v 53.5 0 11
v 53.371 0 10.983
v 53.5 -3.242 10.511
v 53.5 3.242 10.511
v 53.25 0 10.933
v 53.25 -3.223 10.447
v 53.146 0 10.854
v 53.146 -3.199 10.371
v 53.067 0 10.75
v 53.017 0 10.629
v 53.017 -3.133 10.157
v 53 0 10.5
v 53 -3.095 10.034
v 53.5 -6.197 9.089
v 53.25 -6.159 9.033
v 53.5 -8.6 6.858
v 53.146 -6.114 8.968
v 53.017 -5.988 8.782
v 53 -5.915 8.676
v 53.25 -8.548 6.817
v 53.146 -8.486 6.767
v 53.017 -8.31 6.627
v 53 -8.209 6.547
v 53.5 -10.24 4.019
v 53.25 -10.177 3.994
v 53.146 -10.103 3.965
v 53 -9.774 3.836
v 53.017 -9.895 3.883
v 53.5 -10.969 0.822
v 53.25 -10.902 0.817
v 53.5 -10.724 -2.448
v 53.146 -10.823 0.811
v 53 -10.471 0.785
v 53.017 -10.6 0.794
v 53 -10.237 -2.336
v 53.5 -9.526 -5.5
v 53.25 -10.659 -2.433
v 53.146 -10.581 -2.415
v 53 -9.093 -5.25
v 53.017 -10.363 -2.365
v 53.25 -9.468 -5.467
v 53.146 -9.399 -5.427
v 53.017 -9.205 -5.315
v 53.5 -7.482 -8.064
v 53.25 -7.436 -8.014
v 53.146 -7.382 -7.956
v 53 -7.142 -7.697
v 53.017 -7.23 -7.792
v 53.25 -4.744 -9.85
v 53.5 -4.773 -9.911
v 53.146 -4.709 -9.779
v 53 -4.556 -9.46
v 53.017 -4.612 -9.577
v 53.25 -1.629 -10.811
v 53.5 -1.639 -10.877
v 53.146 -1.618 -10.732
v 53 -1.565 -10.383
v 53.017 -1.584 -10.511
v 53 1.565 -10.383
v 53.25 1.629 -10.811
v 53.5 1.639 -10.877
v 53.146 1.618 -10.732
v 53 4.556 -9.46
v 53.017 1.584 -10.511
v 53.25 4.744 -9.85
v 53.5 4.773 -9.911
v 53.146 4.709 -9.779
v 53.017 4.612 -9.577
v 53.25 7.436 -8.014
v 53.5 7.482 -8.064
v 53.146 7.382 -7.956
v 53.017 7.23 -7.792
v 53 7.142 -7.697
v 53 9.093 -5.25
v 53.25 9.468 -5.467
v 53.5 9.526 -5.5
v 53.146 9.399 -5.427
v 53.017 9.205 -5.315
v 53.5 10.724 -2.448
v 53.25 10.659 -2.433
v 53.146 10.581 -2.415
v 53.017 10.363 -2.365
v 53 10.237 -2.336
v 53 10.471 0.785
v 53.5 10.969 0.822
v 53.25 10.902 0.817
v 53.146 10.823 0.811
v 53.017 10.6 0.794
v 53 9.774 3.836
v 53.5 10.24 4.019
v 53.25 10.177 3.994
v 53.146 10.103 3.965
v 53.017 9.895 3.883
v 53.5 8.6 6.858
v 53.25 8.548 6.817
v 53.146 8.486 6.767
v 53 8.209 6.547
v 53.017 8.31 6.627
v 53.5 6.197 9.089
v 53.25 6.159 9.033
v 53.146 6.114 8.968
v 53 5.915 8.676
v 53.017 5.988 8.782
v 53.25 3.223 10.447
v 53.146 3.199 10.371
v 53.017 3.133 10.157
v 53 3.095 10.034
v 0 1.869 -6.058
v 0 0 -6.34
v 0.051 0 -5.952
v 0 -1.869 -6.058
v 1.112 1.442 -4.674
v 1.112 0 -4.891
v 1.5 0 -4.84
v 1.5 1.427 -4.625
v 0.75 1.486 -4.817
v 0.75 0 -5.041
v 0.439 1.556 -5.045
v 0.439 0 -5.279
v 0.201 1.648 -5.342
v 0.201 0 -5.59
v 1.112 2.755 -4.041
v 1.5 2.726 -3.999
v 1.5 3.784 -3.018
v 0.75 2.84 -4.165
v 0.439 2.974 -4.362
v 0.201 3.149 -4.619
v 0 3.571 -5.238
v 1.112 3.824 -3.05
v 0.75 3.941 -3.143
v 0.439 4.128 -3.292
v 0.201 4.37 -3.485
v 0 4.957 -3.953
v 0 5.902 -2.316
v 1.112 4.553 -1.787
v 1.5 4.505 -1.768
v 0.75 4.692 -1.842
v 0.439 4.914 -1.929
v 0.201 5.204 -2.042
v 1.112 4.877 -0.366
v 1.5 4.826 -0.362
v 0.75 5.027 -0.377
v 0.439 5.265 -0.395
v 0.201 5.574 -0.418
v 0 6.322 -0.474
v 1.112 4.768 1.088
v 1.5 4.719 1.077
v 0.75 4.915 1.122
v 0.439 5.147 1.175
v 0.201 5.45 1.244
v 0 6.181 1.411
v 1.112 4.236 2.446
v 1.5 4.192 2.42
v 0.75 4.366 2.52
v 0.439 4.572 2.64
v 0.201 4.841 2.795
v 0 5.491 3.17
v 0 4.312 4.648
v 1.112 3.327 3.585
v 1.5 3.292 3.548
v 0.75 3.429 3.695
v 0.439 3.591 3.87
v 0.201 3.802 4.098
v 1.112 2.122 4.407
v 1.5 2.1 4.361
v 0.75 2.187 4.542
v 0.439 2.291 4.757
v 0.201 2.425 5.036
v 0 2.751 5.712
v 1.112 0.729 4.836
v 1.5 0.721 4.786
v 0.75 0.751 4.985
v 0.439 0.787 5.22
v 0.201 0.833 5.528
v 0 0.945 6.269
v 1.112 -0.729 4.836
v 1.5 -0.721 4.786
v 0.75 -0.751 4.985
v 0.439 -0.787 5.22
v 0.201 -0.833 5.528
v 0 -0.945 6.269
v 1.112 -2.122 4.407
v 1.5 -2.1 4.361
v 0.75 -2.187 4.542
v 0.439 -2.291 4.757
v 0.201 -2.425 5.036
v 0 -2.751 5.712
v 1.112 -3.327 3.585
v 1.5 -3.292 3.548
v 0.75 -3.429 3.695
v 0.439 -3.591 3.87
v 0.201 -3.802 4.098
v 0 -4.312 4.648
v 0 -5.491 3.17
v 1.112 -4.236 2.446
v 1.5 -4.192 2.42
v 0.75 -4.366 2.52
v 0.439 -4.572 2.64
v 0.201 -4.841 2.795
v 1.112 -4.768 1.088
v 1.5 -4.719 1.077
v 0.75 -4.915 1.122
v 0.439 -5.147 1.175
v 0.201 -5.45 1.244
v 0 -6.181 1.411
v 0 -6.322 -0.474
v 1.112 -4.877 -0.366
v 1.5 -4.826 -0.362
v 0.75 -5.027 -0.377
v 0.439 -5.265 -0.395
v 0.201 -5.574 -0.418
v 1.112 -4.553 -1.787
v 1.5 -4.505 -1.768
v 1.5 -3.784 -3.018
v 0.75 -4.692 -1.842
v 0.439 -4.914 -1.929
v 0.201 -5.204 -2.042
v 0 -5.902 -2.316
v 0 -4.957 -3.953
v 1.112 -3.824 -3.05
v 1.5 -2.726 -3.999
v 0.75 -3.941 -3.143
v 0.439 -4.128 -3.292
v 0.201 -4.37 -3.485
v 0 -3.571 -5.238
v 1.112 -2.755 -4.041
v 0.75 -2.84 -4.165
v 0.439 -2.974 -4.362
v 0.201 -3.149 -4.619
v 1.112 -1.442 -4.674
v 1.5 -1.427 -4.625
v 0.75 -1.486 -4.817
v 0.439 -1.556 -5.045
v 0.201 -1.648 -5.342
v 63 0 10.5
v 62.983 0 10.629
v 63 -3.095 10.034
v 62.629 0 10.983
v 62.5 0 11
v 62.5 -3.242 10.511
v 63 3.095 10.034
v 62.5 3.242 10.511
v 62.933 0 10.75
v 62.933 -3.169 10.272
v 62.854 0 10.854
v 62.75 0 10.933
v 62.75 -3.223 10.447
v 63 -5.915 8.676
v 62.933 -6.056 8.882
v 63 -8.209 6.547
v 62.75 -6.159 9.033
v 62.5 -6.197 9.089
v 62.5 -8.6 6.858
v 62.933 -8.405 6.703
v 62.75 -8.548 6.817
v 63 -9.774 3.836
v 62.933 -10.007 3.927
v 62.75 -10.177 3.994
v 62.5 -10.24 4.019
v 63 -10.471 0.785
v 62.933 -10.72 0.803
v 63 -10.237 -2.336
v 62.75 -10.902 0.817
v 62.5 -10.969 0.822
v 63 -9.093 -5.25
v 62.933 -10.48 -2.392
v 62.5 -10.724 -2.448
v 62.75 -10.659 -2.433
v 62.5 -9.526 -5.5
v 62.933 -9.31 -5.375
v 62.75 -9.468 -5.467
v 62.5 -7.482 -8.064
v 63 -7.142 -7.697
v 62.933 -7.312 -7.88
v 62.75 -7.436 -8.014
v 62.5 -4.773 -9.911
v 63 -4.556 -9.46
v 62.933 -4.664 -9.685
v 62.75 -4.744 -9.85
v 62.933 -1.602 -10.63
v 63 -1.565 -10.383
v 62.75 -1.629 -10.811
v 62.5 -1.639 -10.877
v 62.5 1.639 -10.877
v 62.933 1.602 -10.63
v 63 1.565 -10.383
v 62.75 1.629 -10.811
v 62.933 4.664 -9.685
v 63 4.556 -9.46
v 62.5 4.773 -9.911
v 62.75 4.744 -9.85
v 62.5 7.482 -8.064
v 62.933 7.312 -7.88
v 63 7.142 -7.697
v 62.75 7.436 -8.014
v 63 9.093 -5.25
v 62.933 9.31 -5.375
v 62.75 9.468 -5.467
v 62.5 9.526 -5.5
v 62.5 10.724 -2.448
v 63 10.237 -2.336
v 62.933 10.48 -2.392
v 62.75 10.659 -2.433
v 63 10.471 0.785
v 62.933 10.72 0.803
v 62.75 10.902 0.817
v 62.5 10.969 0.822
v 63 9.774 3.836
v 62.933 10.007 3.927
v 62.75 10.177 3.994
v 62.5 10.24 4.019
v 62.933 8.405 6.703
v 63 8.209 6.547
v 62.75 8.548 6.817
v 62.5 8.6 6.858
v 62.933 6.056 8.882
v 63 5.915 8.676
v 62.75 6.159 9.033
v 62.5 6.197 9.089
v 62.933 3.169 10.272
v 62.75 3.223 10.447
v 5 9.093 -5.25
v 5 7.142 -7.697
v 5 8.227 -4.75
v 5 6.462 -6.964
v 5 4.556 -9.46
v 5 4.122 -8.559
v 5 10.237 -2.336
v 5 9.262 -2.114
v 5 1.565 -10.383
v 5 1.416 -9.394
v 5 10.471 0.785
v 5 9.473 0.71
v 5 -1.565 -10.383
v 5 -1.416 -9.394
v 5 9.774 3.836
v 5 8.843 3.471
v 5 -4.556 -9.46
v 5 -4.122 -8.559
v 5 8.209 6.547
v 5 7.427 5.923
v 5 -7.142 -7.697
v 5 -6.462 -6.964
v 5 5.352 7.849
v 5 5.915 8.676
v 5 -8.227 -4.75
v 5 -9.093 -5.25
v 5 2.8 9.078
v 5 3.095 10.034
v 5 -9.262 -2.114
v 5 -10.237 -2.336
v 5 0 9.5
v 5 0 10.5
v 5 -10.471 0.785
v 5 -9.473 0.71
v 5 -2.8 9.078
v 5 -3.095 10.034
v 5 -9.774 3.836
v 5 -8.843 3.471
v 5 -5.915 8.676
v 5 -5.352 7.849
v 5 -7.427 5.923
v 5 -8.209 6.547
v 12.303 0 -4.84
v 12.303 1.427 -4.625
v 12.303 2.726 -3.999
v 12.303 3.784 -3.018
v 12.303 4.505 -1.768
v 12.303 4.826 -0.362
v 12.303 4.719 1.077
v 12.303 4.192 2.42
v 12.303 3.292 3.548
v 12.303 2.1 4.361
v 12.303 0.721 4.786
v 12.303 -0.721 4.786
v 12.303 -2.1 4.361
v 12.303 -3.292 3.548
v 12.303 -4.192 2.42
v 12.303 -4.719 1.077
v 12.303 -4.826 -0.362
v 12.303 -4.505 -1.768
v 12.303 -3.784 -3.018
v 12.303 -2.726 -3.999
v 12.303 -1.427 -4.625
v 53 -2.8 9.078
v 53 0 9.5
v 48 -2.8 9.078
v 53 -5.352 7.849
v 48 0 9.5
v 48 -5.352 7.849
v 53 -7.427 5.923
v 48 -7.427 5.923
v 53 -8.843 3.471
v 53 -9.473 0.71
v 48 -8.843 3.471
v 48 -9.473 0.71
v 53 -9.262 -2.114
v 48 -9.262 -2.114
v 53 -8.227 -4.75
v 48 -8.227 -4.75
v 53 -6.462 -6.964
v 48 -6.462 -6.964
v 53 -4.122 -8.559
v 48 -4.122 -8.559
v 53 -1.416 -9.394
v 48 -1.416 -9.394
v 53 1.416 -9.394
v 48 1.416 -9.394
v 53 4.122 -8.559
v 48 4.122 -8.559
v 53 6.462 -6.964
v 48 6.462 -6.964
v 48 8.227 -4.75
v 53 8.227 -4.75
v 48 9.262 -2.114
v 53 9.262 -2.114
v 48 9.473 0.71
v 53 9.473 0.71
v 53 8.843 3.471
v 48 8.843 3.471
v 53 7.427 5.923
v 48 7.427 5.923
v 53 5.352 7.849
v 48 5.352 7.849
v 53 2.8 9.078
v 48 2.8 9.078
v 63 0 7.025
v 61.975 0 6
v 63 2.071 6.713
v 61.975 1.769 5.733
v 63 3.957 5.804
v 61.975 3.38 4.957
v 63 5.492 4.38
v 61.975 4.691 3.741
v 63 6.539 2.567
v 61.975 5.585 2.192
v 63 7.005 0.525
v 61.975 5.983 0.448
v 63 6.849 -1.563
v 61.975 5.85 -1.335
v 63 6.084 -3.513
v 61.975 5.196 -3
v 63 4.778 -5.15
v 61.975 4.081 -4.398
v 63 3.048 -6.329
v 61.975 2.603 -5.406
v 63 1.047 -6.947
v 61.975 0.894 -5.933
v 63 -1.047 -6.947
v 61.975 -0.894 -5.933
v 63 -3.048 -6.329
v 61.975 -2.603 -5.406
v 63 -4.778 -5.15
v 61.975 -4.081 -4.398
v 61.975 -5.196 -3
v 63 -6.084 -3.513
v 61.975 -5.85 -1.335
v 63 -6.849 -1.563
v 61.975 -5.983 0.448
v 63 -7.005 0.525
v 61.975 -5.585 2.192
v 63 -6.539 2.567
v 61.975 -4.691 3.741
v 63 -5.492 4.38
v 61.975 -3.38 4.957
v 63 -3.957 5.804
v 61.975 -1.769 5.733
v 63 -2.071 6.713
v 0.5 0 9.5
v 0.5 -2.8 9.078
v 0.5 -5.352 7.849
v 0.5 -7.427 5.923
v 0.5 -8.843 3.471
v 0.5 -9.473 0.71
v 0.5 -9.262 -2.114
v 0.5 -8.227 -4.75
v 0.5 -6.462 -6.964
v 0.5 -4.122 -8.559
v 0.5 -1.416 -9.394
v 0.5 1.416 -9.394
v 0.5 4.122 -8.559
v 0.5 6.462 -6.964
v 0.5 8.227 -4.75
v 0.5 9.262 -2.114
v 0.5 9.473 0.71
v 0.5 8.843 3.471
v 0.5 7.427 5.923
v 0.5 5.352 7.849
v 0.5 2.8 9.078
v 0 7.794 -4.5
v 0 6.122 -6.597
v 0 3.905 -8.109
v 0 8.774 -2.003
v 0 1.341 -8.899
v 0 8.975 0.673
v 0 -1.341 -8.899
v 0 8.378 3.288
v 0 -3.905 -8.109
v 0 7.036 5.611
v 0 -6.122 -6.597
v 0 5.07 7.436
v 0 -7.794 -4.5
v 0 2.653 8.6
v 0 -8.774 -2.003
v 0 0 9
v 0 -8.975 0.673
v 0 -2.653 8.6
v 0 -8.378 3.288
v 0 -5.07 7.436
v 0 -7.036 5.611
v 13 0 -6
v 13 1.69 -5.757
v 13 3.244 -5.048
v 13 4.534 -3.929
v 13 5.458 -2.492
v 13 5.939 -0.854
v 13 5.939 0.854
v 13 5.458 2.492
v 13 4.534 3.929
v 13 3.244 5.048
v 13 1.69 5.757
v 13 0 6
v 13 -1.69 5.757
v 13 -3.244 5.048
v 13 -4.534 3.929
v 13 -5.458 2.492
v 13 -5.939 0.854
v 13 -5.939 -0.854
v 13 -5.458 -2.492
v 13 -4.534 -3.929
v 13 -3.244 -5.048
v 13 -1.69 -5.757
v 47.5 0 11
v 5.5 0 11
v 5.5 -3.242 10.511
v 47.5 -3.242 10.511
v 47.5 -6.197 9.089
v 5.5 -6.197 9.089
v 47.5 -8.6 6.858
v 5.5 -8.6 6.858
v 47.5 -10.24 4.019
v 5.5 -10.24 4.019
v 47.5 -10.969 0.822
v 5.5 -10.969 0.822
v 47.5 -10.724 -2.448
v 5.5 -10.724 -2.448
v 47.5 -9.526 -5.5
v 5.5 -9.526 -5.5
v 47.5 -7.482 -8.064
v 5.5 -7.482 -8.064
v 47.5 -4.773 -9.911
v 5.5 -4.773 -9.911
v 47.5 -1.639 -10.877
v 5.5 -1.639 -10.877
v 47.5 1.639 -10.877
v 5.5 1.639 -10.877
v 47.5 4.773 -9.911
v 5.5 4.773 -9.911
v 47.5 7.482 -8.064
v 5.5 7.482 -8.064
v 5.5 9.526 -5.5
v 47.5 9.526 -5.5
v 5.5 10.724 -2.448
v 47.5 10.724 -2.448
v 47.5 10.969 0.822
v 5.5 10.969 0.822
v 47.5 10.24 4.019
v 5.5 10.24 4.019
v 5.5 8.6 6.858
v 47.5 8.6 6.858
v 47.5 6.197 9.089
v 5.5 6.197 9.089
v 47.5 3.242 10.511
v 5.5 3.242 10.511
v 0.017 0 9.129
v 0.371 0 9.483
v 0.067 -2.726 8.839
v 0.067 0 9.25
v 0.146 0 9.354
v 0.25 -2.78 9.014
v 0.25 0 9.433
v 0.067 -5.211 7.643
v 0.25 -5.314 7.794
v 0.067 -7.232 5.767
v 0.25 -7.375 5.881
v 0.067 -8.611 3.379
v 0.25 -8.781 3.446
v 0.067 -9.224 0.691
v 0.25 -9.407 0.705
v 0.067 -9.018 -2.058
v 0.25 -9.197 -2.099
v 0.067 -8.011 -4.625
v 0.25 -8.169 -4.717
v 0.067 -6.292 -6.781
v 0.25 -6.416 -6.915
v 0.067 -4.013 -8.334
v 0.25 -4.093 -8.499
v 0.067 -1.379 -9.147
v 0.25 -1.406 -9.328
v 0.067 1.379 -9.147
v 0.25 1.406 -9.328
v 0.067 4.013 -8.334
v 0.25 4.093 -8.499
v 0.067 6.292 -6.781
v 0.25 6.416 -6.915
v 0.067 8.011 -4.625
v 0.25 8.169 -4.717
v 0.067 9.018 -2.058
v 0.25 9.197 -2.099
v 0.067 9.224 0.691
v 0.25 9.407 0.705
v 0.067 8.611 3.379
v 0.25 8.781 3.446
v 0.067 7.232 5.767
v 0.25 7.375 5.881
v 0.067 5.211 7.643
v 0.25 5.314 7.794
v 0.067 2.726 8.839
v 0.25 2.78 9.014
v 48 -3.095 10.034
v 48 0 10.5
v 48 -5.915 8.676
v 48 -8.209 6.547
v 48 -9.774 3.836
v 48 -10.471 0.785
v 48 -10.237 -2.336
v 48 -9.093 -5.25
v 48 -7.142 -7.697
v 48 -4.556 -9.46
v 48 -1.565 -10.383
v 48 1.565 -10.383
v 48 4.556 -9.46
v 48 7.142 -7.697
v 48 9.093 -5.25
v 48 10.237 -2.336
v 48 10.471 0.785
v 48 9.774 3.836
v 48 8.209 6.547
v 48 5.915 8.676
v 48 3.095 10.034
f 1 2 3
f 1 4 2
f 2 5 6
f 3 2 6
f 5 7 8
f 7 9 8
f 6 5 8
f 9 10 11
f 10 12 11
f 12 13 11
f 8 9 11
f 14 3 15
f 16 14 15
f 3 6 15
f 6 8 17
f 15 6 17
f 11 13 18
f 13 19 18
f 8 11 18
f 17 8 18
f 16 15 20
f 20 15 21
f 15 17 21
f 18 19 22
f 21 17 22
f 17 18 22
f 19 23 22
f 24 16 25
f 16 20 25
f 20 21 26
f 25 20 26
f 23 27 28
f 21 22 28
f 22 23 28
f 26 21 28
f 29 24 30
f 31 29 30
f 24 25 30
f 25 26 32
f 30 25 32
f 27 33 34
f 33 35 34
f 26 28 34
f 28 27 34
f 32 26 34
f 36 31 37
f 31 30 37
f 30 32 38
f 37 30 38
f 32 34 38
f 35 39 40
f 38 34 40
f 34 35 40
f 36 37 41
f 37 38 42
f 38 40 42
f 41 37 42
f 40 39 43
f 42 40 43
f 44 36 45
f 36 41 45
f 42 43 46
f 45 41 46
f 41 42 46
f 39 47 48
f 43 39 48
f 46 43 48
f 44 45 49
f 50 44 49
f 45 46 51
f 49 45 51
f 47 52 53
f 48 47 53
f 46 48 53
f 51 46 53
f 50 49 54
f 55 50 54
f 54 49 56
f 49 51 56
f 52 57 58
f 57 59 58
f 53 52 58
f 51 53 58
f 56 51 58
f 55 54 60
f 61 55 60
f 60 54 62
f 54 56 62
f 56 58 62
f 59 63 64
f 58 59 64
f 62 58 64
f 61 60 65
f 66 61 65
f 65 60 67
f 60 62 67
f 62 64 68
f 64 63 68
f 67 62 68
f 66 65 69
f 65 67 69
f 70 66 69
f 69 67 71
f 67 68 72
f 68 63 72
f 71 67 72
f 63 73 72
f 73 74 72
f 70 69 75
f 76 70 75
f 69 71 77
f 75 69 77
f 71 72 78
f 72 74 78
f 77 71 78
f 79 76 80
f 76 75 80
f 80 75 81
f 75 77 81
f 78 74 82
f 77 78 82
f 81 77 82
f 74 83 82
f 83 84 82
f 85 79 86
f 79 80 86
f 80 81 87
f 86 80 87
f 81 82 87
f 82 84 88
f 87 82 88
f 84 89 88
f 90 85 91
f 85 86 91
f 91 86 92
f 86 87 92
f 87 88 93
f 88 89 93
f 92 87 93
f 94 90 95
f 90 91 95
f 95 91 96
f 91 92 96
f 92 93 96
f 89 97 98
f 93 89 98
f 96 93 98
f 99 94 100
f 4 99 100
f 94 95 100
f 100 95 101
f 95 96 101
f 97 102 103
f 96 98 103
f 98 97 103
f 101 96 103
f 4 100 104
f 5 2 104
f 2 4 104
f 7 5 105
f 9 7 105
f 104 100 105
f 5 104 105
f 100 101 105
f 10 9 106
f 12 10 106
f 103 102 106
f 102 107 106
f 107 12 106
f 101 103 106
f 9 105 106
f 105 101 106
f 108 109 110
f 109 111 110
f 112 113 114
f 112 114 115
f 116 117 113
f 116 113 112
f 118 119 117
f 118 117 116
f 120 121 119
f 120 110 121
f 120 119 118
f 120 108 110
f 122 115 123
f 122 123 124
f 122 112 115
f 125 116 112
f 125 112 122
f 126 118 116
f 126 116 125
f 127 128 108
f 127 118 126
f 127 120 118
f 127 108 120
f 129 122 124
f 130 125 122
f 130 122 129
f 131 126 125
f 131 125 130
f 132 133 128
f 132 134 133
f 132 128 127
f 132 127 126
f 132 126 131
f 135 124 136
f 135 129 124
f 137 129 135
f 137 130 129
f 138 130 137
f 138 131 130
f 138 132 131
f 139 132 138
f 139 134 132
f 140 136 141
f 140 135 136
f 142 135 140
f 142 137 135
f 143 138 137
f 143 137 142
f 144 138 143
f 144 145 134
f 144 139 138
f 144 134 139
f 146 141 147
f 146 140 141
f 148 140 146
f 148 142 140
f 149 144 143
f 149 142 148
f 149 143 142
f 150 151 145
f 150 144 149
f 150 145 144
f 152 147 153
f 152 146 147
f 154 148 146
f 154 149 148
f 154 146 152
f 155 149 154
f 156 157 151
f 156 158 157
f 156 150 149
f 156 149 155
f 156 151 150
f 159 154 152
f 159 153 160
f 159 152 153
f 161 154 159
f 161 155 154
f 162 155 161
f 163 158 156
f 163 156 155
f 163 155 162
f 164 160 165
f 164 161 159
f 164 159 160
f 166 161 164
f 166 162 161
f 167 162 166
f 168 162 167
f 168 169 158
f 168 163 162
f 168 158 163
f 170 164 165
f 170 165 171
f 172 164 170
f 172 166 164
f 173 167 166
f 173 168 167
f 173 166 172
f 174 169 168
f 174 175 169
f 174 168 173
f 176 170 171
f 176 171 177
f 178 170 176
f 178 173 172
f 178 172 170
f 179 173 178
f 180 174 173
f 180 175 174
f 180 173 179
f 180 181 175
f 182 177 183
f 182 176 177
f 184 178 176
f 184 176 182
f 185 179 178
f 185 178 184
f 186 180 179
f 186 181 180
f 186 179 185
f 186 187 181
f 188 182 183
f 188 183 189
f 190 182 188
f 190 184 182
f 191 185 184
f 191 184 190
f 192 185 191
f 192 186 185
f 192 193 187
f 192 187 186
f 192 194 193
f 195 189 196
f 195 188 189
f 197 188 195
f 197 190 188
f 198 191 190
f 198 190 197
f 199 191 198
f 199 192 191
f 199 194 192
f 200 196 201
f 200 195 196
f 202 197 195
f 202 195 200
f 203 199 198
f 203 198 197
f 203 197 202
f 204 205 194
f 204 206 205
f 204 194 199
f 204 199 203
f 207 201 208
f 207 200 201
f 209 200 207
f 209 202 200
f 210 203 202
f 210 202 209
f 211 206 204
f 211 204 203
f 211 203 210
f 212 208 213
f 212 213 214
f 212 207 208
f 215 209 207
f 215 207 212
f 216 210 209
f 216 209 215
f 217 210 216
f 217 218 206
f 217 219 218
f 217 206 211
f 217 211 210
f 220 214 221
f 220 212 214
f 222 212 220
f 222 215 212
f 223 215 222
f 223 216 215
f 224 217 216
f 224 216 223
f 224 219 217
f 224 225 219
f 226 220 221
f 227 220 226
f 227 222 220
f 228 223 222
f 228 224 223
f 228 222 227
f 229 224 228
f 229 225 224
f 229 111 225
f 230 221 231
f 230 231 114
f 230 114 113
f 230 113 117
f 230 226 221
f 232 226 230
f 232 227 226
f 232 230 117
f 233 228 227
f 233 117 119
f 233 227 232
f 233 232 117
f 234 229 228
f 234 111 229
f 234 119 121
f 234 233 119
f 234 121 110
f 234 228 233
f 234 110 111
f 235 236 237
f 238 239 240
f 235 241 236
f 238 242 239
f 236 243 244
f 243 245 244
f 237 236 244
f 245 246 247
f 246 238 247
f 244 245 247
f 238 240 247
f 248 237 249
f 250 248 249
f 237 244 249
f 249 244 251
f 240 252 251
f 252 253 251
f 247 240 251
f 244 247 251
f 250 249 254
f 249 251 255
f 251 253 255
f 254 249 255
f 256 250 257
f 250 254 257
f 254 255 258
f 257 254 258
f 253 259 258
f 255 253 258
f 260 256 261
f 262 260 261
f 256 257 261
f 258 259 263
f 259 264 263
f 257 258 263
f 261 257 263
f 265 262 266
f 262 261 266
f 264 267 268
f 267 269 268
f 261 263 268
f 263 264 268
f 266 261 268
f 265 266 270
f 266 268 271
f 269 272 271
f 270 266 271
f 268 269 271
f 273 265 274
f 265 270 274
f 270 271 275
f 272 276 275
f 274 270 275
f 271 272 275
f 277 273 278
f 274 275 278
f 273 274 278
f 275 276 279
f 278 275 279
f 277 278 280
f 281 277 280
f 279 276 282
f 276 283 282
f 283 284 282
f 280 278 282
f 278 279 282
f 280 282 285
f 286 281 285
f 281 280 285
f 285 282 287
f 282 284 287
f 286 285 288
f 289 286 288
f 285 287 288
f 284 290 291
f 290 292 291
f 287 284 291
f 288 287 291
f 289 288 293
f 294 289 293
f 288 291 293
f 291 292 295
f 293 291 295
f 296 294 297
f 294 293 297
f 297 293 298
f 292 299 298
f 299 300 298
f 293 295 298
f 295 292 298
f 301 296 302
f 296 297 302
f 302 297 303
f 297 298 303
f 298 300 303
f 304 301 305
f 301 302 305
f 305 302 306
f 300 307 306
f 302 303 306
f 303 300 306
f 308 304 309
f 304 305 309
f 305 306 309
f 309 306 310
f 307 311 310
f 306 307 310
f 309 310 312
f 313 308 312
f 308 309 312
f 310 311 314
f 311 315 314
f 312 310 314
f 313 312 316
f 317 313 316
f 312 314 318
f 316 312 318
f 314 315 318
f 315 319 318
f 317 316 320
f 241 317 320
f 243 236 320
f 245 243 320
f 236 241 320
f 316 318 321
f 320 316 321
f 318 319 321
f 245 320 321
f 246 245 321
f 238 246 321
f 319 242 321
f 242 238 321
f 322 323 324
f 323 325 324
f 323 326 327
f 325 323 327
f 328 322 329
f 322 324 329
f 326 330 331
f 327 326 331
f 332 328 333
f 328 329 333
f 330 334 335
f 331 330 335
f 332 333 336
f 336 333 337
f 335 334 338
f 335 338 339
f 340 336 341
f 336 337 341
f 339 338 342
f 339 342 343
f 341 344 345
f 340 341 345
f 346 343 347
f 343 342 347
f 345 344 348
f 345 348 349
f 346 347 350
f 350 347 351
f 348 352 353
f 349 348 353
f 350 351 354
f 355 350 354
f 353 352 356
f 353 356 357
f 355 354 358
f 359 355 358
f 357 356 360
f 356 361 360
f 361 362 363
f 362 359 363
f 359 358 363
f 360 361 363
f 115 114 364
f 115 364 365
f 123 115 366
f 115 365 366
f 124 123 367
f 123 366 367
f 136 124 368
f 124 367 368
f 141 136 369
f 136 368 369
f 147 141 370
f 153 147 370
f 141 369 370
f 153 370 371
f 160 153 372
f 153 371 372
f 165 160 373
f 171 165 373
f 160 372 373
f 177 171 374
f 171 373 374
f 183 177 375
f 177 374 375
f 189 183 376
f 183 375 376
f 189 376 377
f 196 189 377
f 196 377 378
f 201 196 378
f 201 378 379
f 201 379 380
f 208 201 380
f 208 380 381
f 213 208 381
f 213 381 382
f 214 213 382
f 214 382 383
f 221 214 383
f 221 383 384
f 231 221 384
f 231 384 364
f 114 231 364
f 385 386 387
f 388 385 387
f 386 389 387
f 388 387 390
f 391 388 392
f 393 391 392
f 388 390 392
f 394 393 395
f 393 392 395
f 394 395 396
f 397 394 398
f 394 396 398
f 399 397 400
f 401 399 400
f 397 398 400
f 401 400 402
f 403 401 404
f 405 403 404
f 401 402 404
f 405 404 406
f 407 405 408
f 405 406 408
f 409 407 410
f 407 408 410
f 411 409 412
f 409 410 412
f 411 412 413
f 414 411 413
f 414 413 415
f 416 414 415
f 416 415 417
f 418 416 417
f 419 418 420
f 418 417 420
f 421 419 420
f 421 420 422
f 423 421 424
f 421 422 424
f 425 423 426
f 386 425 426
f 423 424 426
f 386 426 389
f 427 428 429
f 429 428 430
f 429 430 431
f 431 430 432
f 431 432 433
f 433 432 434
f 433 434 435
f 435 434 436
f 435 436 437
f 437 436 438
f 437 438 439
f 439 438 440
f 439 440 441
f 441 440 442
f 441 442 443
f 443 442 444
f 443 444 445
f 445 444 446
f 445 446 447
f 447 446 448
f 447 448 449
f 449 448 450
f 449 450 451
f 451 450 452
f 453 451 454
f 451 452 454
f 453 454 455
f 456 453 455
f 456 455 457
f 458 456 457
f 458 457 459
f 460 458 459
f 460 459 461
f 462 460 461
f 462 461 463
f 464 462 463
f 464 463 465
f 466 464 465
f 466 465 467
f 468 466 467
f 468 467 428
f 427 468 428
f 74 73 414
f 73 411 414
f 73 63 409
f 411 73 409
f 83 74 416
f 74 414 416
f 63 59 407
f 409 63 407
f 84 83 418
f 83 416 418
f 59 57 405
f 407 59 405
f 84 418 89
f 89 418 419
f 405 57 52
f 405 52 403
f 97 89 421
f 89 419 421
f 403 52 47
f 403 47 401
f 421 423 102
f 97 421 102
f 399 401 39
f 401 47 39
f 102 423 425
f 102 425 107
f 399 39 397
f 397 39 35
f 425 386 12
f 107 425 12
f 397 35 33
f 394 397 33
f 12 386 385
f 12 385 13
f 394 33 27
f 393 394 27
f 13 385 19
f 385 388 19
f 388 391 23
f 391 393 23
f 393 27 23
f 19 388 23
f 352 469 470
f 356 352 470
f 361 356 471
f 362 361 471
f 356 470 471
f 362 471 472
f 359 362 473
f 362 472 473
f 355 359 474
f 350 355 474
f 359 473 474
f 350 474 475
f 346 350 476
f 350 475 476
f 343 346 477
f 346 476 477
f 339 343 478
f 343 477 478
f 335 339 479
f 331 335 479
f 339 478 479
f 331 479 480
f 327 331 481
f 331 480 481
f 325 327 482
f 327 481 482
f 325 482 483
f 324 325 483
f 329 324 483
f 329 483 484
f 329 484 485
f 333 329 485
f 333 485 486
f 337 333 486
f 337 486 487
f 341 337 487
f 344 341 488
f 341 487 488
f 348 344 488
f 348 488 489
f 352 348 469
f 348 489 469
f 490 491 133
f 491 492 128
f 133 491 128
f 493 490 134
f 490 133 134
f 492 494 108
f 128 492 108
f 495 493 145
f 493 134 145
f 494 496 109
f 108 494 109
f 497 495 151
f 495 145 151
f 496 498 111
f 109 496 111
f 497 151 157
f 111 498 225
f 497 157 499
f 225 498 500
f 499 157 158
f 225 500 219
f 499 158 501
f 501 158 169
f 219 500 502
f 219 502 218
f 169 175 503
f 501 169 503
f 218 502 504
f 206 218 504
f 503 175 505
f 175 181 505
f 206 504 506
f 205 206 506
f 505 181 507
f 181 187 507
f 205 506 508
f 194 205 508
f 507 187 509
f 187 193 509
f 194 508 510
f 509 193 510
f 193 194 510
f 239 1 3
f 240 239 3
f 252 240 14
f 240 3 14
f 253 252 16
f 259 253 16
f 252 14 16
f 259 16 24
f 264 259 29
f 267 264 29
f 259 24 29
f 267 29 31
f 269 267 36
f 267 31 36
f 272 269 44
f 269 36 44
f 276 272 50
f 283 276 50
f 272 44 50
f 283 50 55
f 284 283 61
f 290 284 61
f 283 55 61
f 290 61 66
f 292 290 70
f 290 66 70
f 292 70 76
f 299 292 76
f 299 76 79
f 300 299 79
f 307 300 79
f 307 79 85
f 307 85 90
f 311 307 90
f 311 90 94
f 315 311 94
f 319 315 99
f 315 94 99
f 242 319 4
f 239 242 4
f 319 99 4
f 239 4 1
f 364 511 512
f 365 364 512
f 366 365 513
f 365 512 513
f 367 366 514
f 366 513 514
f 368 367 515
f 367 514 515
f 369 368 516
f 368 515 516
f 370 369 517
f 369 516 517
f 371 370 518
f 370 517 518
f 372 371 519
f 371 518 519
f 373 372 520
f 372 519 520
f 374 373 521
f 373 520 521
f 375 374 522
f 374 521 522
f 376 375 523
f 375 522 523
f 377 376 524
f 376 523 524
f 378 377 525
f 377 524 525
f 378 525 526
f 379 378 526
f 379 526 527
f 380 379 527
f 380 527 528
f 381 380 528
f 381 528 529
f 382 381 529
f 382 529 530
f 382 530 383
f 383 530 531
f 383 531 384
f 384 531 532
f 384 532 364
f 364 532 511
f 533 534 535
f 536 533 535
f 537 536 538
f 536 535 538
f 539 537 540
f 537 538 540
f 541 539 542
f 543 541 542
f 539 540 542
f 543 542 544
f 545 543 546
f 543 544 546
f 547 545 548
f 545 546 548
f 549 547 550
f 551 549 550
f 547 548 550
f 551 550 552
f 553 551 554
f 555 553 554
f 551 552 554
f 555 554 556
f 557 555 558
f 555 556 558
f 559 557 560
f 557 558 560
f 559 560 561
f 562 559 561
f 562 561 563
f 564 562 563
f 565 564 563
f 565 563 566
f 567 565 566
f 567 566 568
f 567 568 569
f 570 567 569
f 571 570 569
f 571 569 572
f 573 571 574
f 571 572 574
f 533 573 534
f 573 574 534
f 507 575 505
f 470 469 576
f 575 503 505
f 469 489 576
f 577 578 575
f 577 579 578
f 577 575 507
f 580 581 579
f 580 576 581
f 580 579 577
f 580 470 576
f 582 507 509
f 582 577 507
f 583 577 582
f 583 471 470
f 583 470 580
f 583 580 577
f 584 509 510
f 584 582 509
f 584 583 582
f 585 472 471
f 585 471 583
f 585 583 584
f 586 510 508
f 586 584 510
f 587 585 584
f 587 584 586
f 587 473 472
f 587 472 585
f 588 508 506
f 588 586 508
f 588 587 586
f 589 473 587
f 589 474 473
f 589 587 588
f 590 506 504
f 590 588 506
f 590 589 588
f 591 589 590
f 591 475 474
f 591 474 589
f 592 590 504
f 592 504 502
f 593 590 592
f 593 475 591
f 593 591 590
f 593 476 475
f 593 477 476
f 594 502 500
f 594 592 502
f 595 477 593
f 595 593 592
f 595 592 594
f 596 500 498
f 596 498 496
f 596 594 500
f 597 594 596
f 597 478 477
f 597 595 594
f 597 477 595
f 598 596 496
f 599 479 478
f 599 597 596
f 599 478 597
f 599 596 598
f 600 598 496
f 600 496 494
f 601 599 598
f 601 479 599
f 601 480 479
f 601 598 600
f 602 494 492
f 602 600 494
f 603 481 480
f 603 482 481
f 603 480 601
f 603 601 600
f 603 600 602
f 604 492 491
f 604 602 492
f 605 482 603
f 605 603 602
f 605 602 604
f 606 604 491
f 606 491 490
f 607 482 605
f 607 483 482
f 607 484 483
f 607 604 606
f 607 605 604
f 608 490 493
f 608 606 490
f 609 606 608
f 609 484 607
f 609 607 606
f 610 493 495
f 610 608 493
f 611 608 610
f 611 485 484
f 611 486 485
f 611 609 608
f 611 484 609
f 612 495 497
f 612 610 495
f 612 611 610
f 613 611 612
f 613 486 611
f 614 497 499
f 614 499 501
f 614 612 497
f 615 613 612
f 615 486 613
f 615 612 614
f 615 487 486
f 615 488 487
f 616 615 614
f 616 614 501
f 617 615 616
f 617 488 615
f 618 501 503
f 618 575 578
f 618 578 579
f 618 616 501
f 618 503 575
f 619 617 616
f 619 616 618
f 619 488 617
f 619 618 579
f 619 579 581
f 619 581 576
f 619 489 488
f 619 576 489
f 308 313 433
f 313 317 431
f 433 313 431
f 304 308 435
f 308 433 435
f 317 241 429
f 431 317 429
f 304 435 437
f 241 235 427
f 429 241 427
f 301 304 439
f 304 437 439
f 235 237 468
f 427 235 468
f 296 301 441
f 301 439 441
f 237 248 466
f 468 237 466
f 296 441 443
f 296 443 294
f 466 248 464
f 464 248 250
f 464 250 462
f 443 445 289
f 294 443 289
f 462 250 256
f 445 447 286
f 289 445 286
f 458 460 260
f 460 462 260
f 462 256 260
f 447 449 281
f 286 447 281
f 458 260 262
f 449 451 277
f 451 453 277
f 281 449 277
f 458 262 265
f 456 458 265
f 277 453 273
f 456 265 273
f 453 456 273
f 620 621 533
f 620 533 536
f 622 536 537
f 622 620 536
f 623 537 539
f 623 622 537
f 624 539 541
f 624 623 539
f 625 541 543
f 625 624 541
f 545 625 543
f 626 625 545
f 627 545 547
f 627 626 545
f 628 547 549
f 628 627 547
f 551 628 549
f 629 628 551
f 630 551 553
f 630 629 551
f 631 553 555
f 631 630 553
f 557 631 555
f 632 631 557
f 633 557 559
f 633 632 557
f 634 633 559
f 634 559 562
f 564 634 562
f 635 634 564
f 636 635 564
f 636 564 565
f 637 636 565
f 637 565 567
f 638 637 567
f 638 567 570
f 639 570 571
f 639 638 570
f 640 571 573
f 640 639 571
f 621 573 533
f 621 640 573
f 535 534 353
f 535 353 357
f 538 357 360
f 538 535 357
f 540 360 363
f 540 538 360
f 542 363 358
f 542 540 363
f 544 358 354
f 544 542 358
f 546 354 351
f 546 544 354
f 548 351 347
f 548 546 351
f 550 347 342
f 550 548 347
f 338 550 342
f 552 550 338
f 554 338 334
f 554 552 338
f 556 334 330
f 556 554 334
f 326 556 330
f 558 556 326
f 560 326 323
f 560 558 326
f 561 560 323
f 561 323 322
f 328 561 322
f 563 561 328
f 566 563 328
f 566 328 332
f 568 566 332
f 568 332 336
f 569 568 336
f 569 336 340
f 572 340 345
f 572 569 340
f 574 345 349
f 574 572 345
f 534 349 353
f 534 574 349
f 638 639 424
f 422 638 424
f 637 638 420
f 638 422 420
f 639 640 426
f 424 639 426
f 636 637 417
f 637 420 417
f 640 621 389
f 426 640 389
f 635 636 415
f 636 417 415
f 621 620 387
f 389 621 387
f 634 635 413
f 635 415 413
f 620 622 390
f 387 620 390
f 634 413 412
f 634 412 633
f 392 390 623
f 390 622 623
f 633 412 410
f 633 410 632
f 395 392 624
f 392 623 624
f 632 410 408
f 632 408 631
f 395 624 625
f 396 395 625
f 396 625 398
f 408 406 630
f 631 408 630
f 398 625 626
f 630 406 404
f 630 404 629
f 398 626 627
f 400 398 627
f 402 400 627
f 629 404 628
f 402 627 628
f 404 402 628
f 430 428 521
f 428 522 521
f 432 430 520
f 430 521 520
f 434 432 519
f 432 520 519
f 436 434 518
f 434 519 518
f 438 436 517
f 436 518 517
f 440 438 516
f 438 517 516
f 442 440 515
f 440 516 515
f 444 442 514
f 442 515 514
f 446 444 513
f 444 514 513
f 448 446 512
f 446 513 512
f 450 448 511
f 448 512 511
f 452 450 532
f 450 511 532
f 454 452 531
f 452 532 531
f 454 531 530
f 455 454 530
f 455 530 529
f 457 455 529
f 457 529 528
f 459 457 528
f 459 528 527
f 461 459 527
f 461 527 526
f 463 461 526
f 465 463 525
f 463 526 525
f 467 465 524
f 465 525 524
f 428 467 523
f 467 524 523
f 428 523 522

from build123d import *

# Parameters (mm, degrees)
FURO_ROSCADO_DE_M141_D           = 12
FURO_ROSCADO_DE_M141_DEPTH       = 50
FURO_ROSCADO_DE_M141_CSINK_D     = 14.05
FURO_ROSCADO_DE_M141_CSINK_ANGLE = 90
FURO_ROSCADO_DE_M141_TIP         = 3.605163714
FURO1_D                          = 9.68
FILETE1_R                        = 0.5
FILETE2_R                        = 1.5
CHANFRO1_SIZE                    = 0.5


with BuildPart() as part:
    # Esboço1 → Revolução1 (revolve)
    with BuildSketch(Plane.XY, mode=Mode.PRIVATE) as revolu_o1_sk:
        Polygon((0, 0), (63, 0), (63, 11), (53, 11), (53, 9.5), (48, 9.5), (48, 11), (5, 11), (5, 9.5), (0, 9.5), align=None)
    revolve(revolu_o1_sk.sketch.rotate(Axis((0, 0, 0), (1, 0, 0)), 90), axis=Axis((0, 0, 0), (1, 0, 0)))

    # Furo roscado de M141
    with Locations(Plane(origin=(63, 0, 0), x_dir=(0, 0, -1), z_dir=(1, 0, 0))):
        with Locations((0, 0)):
            CounterSinkHole(FURO_ROSCADO_DE_M141_D / 2, FURO_ROSCADO_DE_M141_CSINK_D / 2, depth=FURO_ROSCADO_DE_M141_DEPTH, counter_sink_angle=FURO_ROSCADO_DE_M141_CSINK_ANGLE)
            with Locations((0, 0, -(FURO_ROSCADO_DE_M141_DEPTH + FURO_ROSCADO_DE_M141_TIP / 2))):  # 118° drill point
                Cone(0, FURO_ROSCADO_DE_M141_D / 2, FURO_ROSCADO_DE_M141_TIP, mode=Mode.SUBTRACT)

    # Furo1 (through all)
    with Locations(Plane.ZY):
        with Locations((0, 0)):
            Hole(FURO1_D / 2)

    # Filete1
    filete1_edges = [part.edges().sort_by_distance(p)[0] for p in [
        (63, 0, -11),
        (0, 0, -9.5),
        (53, 0, -11),
    ]]
    fillet(filete1_edges, radius=FILETE1_R)

    # Filete2
    filete2_edges = [part.edges().sort_by_distance(p)[0] for p in [
        (0, 0, 4.84),
    ]]
    fillet(filete2_edges, radius=FILETE2_R)

    # Chanfro1
    chanfro1_edges = [part.edges().sort_by_distance(p)[0] for p in [
        (5, 0, -11),
        (48, 0, -11),
    ]]
    chamfer(chanfro1_edges, length=CHANFRO1_SIZE)


solid = part.part
